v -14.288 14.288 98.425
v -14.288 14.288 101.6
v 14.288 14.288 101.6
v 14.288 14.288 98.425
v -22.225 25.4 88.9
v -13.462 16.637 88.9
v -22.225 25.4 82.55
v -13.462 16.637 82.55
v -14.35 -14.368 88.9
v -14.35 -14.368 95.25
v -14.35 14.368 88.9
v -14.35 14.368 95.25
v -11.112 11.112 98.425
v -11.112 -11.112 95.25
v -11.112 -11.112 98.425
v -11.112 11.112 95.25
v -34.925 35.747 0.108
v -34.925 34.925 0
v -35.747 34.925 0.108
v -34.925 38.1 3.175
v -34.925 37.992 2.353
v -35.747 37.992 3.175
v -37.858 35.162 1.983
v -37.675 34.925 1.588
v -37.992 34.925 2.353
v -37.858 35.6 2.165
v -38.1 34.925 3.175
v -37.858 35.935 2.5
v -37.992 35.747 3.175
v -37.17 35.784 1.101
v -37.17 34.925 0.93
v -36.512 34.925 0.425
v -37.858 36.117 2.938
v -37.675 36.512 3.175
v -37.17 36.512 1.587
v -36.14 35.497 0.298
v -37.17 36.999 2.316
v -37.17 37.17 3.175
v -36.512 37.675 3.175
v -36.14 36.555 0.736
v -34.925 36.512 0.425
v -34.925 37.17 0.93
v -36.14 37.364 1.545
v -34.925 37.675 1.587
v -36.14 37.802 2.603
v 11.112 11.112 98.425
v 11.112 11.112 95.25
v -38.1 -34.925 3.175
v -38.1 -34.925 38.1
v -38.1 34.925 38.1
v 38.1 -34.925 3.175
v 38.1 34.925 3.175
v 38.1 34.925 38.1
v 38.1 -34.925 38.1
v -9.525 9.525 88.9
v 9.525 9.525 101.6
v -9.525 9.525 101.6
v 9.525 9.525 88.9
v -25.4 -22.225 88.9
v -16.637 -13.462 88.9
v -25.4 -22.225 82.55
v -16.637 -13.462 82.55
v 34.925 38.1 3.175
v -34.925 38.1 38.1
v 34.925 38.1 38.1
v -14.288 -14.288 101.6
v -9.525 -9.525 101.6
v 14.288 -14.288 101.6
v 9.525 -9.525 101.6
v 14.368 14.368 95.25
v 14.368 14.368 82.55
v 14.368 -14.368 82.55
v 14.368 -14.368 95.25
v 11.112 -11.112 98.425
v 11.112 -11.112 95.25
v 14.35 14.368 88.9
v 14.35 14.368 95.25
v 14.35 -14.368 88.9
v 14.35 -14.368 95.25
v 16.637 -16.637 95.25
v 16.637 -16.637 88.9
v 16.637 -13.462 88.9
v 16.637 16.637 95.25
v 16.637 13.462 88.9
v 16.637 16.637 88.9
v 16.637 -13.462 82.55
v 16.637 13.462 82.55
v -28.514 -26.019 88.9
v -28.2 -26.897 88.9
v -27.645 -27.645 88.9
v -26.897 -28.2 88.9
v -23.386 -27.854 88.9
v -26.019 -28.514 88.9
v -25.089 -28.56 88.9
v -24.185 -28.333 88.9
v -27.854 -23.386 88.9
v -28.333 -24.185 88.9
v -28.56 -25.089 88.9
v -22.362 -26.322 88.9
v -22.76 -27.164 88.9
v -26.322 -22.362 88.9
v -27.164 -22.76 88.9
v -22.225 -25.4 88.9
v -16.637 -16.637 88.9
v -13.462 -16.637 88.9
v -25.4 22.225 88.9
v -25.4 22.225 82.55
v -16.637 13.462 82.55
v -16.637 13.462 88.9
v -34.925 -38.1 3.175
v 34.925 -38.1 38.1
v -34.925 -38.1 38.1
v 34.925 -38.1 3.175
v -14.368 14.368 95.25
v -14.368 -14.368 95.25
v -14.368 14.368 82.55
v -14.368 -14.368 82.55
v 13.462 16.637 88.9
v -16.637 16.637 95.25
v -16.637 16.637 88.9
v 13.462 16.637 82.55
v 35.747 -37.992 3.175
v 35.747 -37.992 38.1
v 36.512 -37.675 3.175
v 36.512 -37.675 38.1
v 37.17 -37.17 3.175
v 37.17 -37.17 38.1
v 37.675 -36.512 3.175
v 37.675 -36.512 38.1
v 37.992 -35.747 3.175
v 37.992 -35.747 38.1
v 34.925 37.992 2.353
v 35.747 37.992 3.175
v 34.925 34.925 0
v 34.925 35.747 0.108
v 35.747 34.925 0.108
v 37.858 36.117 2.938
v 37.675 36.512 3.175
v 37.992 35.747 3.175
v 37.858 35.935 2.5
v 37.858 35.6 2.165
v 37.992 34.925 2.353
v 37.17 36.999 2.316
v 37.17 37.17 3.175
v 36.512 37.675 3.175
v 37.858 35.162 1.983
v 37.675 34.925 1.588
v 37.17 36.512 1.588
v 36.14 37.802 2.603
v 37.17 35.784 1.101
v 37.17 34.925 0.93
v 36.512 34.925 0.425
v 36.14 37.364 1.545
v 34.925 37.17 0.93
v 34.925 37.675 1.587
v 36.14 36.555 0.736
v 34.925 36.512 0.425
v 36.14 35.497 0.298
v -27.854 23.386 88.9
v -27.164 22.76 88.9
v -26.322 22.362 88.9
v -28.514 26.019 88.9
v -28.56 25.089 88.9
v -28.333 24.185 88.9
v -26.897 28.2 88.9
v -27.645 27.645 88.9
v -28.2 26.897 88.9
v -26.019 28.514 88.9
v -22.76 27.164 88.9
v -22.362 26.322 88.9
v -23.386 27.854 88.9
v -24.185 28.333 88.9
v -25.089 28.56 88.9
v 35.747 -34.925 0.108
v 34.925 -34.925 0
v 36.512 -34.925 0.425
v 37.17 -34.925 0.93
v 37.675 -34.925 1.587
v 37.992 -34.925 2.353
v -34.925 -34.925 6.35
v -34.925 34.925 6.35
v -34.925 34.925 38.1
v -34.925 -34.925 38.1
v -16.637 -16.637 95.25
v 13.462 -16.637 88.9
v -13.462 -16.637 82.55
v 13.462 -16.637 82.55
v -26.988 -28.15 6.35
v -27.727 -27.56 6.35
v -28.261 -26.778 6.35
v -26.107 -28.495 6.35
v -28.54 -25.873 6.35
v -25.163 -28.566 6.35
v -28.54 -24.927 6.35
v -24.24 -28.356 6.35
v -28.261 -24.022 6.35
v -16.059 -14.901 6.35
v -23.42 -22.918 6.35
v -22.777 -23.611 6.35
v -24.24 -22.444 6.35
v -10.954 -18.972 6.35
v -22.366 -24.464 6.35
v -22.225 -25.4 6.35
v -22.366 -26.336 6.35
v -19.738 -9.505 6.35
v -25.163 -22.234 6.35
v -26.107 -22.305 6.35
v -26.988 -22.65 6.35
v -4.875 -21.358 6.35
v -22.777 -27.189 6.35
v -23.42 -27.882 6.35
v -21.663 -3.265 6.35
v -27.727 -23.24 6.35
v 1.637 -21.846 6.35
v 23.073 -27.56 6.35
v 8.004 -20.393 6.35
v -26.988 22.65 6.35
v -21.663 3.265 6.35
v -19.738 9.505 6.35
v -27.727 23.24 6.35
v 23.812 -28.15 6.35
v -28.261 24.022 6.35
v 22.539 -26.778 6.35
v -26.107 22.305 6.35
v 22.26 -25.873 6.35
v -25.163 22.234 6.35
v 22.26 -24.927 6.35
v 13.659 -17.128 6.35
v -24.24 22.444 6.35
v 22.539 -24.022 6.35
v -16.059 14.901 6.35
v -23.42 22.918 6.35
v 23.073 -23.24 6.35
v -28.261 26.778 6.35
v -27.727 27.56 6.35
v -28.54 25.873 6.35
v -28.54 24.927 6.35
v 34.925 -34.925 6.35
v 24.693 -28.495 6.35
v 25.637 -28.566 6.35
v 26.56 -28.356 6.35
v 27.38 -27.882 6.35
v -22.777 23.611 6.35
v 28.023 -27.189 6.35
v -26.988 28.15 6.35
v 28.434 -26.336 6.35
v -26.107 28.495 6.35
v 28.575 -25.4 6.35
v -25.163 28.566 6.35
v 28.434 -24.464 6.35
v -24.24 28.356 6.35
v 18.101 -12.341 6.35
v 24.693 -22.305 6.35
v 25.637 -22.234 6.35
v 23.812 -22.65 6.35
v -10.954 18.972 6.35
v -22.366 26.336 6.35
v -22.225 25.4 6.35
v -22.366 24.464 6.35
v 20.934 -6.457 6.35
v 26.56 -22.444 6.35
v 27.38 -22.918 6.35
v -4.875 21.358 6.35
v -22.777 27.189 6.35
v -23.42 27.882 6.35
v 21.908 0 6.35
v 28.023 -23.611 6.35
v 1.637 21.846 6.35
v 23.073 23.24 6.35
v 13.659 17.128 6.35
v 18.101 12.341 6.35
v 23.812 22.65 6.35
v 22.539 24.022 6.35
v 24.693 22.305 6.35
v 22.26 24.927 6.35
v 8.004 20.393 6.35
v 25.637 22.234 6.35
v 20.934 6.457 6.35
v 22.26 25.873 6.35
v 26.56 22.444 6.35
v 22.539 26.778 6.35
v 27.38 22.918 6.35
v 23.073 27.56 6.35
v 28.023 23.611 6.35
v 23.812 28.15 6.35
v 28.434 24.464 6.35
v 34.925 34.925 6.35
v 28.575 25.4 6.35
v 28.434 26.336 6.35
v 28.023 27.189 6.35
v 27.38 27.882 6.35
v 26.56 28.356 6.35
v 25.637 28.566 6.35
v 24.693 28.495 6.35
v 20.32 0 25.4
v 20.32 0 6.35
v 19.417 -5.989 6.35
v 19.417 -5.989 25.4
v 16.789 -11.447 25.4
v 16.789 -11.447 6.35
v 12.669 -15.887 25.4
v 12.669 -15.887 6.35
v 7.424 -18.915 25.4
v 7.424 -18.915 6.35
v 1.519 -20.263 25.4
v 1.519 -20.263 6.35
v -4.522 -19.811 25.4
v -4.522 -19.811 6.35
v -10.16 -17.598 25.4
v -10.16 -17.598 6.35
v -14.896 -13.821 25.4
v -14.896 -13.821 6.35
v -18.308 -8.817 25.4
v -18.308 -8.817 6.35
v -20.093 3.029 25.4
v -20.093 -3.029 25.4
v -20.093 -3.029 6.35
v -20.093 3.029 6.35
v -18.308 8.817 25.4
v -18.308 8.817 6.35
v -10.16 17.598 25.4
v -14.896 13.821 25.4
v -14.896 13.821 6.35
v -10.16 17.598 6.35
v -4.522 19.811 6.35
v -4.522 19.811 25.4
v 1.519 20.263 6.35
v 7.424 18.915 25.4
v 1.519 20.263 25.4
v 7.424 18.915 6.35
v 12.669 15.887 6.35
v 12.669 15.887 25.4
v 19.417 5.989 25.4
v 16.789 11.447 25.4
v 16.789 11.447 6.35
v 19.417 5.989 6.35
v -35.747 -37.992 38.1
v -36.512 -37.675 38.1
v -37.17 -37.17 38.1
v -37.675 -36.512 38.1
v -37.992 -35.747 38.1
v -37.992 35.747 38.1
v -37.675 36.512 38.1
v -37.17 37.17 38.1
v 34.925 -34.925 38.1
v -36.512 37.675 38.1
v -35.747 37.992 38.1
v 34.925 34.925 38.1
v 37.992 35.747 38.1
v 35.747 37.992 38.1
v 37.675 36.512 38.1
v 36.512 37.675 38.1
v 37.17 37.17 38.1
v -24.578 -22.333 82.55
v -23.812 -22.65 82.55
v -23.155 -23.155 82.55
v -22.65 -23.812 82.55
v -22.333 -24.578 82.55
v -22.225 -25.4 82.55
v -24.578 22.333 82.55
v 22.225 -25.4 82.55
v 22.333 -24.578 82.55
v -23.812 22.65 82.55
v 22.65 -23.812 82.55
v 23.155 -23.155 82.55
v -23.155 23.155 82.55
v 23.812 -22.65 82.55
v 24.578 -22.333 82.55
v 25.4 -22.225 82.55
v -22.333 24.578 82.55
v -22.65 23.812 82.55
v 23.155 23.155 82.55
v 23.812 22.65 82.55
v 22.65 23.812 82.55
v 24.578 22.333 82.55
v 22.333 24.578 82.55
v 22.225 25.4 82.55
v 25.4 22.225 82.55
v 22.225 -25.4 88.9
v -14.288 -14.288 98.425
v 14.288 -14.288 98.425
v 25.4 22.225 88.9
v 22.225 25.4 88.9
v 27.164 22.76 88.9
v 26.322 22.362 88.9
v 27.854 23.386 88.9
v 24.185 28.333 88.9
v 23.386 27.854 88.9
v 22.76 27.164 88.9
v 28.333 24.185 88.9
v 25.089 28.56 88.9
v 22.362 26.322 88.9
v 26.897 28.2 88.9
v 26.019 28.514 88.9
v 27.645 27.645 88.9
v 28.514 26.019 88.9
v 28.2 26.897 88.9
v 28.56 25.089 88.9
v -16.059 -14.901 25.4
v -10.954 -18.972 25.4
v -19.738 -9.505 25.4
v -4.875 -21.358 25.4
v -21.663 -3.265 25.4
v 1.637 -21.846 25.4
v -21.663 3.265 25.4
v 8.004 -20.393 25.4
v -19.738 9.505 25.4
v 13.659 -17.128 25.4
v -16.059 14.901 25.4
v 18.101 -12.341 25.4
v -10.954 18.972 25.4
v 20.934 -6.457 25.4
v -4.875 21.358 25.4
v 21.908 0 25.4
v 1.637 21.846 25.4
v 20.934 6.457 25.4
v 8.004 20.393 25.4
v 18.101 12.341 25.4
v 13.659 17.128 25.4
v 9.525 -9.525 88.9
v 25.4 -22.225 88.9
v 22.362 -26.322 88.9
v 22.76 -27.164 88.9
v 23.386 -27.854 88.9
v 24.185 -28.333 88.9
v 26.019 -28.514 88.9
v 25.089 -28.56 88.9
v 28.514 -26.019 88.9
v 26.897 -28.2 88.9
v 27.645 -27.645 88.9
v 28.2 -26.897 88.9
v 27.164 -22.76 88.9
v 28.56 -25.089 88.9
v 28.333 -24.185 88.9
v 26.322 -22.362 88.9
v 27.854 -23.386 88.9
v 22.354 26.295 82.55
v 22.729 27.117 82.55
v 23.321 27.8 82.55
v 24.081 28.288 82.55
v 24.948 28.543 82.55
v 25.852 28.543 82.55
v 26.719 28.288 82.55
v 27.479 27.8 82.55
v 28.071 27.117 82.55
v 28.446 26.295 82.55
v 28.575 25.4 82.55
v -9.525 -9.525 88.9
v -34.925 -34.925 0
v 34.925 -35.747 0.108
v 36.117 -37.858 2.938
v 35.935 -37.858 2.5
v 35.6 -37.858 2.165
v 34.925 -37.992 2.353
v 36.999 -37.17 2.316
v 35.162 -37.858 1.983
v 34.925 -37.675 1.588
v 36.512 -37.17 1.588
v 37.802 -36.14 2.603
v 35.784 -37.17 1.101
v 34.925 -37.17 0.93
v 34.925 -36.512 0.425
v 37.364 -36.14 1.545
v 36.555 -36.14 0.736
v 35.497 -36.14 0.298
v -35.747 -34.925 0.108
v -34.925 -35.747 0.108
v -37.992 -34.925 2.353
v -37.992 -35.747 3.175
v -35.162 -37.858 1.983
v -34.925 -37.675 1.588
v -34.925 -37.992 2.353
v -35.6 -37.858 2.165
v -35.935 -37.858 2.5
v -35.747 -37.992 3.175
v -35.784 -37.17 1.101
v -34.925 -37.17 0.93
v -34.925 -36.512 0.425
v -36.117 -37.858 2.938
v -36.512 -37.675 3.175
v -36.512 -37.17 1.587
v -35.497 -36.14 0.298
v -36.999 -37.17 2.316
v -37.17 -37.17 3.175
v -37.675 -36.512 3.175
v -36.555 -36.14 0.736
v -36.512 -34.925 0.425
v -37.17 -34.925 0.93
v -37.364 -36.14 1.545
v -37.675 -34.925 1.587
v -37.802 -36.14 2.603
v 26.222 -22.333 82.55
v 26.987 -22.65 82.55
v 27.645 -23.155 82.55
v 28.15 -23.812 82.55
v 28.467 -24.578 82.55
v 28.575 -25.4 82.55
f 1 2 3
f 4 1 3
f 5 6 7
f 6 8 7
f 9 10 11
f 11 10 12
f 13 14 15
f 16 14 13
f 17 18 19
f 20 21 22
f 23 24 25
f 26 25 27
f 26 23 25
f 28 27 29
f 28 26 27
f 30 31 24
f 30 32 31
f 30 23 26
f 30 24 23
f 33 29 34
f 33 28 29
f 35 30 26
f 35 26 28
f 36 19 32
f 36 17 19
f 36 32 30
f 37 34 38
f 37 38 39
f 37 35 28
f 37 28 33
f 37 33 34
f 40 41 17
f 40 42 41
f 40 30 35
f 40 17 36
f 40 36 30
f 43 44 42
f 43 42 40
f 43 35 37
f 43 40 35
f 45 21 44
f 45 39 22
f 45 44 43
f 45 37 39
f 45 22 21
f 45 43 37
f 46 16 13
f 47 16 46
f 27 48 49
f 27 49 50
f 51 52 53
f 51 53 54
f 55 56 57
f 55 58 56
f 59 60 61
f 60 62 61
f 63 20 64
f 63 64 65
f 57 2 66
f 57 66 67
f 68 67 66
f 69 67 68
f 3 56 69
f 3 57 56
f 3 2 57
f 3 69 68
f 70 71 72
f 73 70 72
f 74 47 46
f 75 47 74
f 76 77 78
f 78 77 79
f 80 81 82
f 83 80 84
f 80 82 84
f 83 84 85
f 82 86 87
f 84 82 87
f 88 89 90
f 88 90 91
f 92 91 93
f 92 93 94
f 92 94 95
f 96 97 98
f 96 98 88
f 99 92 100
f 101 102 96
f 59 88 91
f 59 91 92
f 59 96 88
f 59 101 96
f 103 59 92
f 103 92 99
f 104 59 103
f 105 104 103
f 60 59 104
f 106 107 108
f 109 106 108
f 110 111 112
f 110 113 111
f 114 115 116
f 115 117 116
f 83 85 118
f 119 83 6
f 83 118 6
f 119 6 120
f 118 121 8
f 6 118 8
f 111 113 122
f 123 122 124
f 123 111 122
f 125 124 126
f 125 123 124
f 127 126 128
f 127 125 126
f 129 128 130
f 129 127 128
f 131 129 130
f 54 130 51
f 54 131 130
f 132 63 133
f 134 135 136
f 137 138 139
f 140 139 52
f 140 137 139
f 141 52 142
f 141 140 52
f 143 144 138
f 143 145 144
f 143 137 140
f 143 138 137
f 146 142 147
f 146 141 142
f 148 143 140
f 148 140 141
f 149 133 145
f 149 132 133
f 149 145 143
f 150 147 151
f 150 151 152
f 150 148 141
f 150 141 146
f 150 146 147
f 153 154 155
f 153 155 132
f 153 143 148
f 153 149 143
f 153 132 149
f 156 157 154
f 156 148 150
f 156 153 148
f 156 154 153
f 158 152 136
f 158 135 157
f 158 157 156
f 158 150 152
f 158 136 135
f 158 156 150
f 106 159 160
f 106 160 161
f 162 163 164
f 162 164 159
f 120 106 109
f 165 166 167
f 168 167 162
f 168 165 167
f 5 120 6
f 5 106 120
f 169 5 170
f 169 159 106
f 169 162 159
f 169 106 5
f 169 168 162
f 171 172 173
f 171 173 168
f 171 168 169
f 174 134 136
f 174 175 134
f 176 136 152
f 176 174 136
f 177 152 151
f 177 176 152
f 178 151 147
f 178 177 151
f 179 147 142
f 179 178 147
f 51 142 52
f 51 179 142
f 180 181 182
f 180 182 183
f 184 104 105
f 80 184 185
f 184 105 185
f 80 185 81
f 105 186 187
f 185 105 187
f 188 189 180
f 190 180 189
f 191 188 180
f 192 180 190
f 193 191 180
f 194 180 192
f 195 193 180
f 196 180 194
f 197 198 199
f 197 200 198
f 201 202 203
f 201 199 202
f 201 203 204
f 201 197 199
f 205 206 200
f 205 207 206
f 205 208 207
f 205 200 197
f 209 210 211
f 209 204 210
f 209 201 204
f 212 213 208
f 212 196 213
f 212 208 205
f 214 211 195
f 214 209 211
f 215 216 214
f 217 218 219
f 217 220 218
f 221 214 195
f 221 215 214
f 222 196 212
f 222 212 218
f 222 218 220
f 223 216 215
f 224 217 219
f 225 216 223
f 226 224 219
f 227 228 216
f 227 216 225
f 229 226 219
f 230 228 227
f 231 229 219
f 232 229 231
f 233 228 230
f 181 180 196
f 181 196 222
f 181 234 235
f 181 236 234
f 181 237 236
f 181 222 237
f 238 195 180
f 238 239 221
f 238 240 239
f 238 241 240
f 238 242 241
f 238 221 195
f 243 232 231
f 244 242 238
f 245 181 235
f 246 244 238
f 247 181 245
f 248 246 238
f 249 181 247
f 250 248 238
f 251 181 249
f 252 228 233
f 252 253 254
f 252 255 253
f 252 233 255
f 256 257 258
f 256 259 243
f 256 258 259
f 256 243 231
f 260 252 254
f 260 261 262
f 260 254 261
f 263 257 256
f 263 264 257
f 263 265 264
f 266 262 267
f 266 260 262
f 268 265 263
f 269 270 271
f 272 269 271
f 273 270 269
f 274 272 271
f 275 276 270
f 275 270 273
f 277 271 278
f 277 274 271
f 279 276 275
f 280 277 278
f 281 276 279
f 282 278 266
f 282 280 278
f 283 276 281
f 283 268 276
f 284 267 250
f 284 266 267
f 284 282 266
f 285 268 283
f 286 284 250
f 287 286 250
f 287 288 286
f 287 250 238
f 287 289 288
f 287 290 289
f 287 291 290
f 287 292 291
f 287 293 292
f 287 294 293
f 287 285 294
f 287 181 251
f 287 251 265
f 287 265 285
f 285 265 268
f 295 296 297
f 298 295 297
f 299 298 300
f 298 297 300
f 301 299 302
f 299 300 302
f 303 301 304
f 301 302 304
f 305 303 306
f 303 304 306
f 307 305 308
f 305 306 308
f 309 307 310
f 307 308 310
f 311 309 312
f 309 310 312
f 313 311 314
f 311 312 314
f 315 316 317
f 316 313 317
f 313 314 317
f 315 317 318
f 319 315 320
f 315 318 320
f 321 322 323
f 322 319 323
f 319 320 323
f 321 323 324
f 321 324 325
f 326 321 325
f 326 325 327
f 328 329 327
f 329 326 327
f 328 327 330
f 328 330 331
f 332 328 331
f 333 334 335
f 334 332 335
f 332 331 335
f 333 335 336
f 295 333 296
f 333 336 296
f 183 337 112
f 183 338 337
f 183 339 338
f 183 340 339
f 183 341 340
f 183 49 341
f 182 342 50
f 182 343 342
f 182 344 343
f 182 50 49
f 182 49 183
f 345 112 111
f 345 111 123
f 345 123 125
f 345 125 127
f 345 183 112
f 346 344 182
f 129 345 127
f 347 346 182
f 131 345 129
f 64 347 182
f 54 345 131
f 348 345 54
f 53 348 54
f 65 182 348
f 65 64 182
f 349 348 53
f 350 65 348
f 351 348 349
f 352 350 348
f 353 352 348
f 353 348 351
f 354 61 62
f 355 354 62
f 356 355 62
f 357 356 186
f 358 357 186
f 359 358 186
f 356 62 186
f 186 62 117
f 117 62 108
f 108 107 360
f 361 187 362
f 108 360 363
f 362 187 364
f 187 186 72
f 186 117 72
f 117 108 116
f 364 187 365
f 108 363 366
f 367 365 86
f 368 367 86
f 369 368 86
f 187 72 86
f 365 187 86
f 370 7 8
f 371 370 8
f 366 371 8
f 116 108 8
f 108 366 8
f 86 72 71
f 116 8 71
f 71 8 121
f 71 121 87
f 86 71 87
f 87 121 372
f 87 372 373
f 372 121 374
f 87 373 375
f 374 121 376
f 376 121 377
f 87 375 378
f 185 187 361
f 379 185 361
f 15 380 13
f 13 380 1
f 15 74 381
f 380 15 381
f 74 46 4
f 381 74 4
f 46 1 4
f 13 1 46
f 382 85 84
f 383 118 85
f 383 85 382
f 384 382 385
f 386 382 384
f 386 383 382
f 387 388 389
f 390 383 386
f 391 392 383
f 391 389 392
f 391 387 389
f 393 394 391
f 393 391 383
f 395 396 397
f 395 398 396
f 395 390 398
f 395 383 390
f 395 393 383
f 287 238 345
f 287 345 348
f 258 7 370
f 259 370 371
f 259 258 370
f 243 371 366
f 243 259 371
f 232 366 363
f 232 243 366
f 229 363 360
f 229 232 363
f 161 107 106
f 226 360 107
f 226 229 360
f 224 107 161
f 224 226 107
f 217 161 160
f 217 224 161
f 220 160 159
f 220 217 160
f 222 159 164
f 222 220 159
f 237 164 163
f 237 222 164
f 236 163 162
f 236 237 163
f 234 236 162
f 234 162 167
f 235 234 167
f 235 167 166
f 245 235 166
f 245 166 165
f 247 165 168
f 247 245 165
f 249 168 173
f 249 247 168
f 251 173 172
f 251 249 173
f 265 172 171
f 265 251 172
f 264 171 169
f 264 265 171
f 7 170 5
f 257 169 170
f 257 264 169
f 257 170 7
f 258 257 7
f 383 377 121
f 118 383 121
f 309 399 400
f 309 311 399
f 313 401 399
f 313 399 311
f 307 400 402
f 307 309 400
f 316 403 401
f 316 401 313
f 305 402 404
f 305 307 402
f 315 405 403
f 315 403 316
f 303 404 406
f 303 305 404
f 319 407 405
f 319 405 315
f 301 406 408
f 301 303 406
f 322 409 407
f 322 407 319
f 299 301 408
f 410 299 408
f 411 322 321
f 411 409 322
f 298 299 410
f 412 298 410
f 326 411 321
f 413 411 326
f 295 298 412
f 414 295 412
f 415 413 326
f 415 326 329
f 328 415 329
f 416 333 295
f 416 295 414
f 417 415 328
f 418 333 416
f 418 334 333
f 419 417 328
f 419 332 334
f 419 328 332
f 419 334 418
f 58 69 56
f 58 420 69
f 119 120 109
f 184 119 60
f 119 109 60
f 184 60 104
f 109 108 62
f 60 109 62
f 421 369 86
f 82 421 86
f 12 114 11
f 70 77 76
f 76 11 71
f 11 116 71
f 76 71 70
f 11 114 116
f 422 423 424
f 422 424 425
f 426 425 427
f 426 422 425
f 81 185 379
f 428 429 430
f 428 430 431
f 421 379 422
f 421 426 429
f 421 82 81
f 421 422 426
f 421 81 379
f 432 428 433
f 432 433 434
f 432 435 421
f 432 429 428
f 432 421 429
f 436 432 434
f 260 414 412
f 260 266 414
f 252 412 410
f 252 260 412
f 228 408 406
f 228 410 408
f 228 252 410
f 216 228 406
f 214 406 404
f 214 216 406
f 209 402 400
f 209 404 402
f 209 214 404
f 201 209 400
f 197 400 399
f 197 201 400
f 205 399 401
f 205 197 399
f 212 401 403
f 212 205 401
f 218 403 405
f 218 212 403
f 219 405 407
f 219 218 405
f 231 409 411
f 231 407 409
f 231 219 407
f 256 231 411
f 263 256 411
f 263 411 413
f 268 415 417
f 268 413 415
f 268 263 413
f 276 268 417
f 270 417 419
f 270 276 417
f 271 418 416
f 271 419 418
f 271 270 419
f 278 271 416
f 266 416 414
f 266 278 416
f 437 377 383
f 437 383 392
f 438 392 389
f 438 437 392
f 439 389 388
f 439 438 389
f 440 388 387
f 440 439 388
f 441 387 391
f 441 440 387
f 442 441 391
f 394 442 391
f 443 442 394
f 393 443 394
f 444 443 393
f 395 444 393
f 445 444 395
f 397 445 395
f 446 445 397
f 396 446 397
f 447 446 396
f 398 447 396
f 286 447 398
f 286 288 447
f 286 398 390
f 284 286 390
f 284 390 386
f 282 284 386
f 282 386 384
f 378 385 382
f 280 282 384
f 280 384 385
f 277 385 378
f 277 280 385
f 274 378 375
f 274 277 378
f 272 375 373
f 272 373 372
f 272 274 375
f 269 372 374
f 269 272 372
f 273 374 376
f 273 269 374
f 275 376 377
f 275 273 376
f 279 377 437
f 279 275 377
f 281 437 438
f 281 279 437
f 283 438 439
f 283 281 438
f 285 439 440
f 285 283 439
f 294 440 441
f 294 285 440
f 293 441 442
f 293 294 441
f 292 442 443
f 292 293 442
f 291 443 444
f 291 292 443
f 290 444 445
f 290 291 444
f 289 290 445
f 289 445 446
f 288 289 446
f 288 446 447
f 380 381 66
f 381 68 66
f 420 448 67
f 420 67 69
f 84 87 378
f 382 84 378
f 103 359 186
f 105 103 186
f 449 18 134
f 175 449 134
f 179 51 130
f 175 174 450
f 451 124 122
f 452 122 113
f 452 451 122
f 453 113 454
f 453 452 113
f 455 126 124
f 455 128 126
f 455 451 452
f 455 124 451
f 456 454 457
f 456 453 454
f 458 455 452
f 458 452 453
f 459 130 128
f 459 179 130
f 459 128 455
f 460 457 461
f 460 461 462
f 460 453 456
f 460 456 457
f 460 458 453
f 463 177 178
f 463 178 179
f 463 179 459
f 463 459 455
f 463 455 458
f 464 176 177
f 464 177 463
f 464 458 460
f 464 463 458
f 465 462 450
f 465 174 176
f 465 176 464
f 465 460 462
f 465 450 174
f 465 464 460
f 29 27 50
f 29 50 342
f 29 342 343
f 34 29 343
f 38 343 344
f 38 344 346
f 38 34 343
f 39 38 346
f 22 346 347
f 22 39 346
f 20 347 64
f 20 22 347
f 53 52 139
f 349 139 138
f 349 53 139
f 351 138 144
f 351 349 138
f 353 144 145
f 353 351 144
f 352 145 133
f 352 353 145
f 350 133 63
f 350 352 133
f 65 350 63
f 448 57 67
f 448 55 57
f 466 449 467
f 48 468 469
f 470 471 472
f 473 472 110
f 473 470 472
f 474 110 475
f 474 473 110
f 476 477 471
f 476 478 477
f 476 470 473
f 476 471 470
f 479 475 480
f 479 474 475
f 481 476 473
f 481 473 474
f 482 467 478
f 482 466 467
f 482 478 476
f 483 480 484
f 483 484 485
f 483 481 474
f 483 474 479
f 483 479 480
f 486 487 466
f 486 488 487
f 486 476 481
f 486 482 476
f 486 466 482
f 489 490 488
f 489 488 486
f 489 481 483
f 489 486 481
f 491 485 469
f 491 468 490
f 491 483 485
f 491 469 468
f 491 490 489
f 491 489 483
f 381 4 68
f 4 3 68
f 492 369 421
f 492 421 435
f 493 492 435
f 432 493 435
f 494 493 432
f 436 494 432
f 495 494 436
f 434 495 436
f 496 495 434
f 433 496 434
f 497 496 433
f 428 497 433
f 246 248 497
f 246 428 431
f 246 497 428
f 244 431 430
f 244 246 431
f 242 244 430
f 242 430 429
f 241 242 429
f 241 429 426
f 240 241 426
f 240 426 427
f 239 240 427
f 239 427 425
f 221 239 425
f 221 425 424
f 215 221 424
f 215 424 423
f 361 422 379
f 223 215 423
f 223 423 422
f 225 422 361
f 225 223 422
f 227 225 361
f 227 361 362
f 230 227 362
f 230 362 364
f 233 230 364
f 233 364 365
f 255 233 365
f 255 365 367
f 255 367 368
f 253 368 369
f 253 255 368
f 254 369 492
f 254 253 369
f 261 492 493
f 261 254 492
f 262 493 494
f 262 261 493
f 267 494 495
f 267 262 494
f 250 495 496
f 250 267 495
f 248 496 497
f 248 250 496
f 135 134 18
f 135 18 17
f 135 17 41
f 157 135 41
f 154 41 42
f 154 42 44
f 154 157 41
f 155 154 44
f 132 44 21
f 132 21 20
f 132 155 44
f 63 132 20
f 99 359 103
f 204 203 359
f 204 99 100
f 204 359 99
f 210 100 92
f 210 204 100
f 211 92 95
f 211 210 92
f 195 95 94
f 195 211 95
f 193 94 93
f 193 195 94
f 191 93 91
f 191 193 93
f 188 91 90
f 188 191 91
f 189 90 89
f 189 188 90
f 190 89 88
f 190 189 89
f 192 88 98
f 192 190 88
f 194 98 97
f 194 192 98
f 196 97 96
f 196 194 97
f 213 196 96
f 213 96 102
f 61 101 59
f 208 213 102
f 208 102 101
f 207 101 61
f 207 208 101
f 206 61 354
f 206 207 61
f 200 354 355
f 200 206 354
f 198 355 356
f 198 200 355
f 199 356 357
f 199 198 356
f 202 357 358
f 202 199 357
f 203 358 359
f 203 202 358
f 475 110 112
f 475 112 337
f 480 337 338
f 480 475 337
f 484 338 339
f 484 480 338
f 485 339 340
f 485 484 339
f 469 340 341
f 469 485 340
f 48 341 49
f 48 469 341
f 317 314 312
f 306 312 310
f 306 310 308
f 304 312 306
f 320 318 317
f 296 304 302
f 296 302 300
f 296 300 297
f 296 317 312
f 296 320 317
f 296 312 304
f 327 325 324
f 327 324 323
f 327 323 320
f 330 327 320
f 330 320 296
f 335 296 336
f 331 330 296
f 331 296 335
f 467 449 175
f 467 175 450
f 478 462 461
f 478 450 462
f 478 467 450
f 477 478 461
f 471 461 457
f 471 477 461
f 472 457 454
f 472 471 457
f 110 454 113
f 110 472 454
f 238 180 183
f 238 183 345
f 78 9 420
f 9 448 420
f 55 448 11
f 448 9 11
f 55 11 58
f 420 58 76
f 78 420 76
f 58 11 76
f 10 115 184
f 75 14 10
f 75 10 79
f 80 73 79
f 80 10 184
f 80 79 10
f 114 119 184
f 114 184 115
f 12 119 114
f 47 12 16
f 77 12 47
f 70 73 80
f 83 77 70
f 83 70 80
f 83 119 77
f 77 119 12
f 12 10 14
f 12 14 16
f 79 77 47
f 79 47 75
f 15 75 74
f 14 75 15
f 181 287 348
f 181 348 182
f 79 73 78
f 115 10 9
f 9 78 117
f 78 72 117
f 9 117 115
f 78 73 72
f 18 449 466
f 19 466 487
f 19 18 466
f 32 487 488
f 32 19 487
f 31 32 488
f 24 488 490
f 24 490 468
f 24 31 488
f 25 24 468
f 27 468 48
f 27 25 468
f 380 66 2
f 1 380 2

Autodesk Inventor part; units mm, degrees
ref_plane "YZ Plane" through (0, 0, 0) normal (1, 0, 0) x (0, 1, 0)
ref_plane "XZ Plane" through (0, 0, 0) normal (0, 1, 0) x (-1, 0, 0)
ref_plane "XY Plane" through (0, 0, 0) normal (0, 0, 1) x (1, 0, 0)
sketch "Sketch1" plane through (0, 0, 0) normal (0, 0, 1) x (1, 0, 0)
  line L0 (38.1, -38.1) -> (-38.1, -38.1)
  line L1 (-38.1, -38.1) -> (-38.1, 38.1)
  line L2 (-38.1, 38.1) -> (38.1, 38.1)
  line L3 (38.1, 38.1) -> (38.1, -38.1)
  line L4 (38.1, -38.1) -> (-38.1, 38.1) construction
  line L5 (-38.1, -38.1) -> (38.1, 38.1) construction
  line L6 (-34.925, -34.925) -> (34.925, -34.925)
  line L7 (34.925, -34.925) -> (34.925, 34.925)
  line L8 (34.925, 34.925) -> (-34.925, 34.925)
  line L9 (-34.925, 34.925) -> (-34.925, -34.925)
  line L10 (-34.925, -34.925) -> (34.925, 34.925) construction
  line L11 (34.925, -34.925) -> (-34.925, 34.925) construction
  point P0 (0, 0)
  dimension "d0" = 76.2
  dimension "d1" = 76.2
  dimension "d2" = 69.85
  dimension "d3" = 69.85
extrude "Extrusion1" add sketch "Sketch1" along normal blind 6.35 contours L0 L1 L2 L3 | L9 L8 L7 L6
extrude "Extrusion2" add sketch "Sketch1" along normal blind 38.1
fillet "Fillet1" radius 3.175 8 edges at (0, 38.1, 0) (38.1, 0, 0) (-38.1, 0, 0) (0, -38.1, 0) (38.1, 38.1, 19.05) (-38.1, 38.1, 19.05) (38.1, -38.1, 19.05) (-38.1, -38.1, 19.05)
sketch "Sketch2" plane through (0, 0, 6.35) normal (0, 0, 1) x (1, 0, 0)
  circle A0 centre (0, 0) radius 20.32
  circle A1 centre (0, 0) radius 21.9075
  dimension "d9" = 40.64
  dimension "d10" = 43.815
extrude "Extrusion3" add sketch "Sketch2" along normal blind 19.05
sketch "Sketch3" plane through (0, 0, 6.35) normal (0, 0, 1) x (1, 0, 0)
  line L0 (-25.4, -25.4) -> (25.4, -25.4)
  line L1 (25.4, -25.4) -> (25.4, 25.4)
  line L2 (25.4, 25.4) -> (-25.4, 25.4)
  line L3 (-25.4, 25.4) -> (-25.4, -25.4)
  line L4 (-25.4, -25.4) -> (25.4, 25.4) construction
  line L5 (25.4, -25.4) -> (-25.4, 25.4) construction
  circle A0 centre (25.4, 25.4) radius 3.175
  circle A1 centre (-25.4, 25.4) radius 3.175
  circle A2 centre (-25.4, -25.4) radius 3.175
  circle A3 centre (25.4, -25.4) radius 3.175
  point P0 (0, 0)
  dimension "d13" = 50.8
  dimension "d14" = 50.8
  dimension "d15" = 6.35
  dimension "d16" = 6.35
  dimension "d17" = 6.35
  dimension "d18" = 6.35
extrude "Extrusion4" add sketch "Sketch3" along normal blind 76.2 contours L3 A2 L0 | L0 A2 L3 | A3 L1 L0 | L0 L1 A3 | A1 L2 L3 | L3 L2 A1 | A0 L2 L1 | L1 L2 A0
sketch "Sketch4" plane through (25.4, 25.4, 82.55) normal (0, 0, 1) x (1, 0, 0)
  line L0 (0, 0) -> (-3.175, 0)
  circle A0 centre (-50.8, -50.8) radius 3.175
  circle A1 centre (0, -50.8) radius 3.175
  circle A2 centre (0, 0) radius 3.175
  circle A3 centre (-50.8, 0) radius 3.175
  circle A4 centre (-50.8, -50.8) radius 3.175 projected
  line L1 (-50.8, -47.625) -> (-47.625, -50.8)
  line L2 (1.5875, -1.5875) -> (-1.5875, 1.5875)
  circle A5 centre (-50.8, 0) radius 3.175 projected
  line L3 (-1.5875, -52.3875) -> (1.5875, -49.2125)
  line L4 (-38.862, -42.037) -> (-11.938, -42.037)
  line L5 (-8.763, -38.862) -> (-8.763, -11.938)
  line L6 (-11.938, -8.763) -> (-38.862, -8.763)
  line L7 (-42.037, -11.938) -> (-42.037, -38.862)
  line L8 (-42.037, -42.037) -> (-8.763, -8.763) construction
  line L9 (-8.763, -42.037) -> (-42.037, -8.763) construction
  line L10 (-11.0316, -39.7684) -> (-39.7684, -39.7684)
  line L11 (-39.7684, -39.7684) -> (-39.7684, -11.0316)
  line L12 (-39.7684, -11.0316) -> (-11.0316, -11.0316)
  line L13 (-11.0316, -11.0316) -> (-11.0316, -39.7684)
  line L14 (-11.0316, -39.7684) -> (-39.7684, -11.0316) construction
  line L15 (-39.7684, -39.7684) -> (-11.0316, -11.0316) construction
  line L16 (-50.8, -3.175) -> (-42.037, -11.938)
  line L17 (1.5875, -49.2125) -> (-8.763, -38.862)
  line L18 (-38.862, -8.763) -> (-47.625, 0)
  line L19 (-8.763, -11.938) -> (1.5875, -1.5875)
  line L20 (-1.5875, 1.5875) -> (-11.938, -8.763)
  line L21 (-42.037, -38.862) -> (-50.8, -47.625)
  line L22 (-47.625, -50.8) -> (-38.862, -42.037)
  line L23 (-11.938, -42.037) -> (-1.5875, -52.3875)
  line L24 (0, -50.8) -> (0, -47.625)
  line L25 (0, -3.175) -> (0, 0)
  line L26 (-50.8, -50.8) -> (-47.625, -50.8)
  line L27 (-3.175, -50.8) -> (0, -50.8)
  line L28 (-50.8, 0) -> (-50.8, -3.175)
  line L29 (-50.8, -47.625) -> (-50.8, -50.8)
  line L30 (-8.763, -11.938) -> (-8.763, -8.763)
  line L31 (-11.938, -8.763) -> (-8.763, -8.763)
  line L32 (-38.862, -8.763) -> (-42.037, -8.763)
  line L33 (-42.037, -11.938) -> (-42.037, -8.763)
  line L34 (-42.037, -38.862) -> (-42.037, -42.037)
  line L35 (-38.862, -42.037) -> (-42.037, -42.037)
  line L36 (-11.938, -42.037) -> (-8.763, -42.037)
  line L37 (-8.763, -42.037) -> (-8.763, -38.862)
  point P0 (-25.4, -25.4)
  point P1 (-25.4, -25.4)
  point P2 (-47.625, 0)
  point P3 (-3.175, -50.8)
  point P4 (0, -47.625)
  point P5 (0, -3.175)
  point P6 (-3.175, 0)
  dimension "d21" = 50.8
  dimension "d22" = 50.8
  dimension "d23" = 33.274
  dimension "d24" = 33.274
extrude "Extrusion5" add sketch "Sketch4" along normal blind 6.35
extrude "Extrusion6" add sketch "Sketch4" along normal blind 12.7 contours L31 L30 L5 L37 L36 L4 L35 L34 L7 L33 L32 L6
sketch "Sketch5" plane through (25.4, 25.4, 95.25) normal (0, 0, 1) x (1, 0, 0)
  circle A0 centre (-25.4, -25.4) radius 20.32 projected
  line L0 (-39.7495, -11.0127) -> (-11.0505, -11.0127)
  line L1 (-11.0505, -11.0127) -> (-11.0505, -39.7873)
  line L2 (-11.0505, -39.7873) -> (-39.7495, -39.7873)
  line L3 (-39.7495, -39.7873) -> (-39.7495, -11.0127)
  line L4 (-39.7495, -11.0127) -> (-11.0505, -39.7873) construction
  line L5 (-11.0505, -11.0127) -> (-39.7495, -39.7873) construction
  line L6 (-34.925, -34.925) -> (-15.875, -34.925)
  line L7 (-15.875, -34.925) -> (-15.875, -15.875)
  line L8 (-15.875, -15.875) -> (-34.925, -15.875)
  line L9 (-34.925, -15.875) -> (-34.925, -34.925)
  line L10 (-34.925, -34.925) -> (-15.875, -15.875) construction
  line L11 (-15.875, -34.925) -> (-34.925, -15.875) construction
  line L12 (-14.2875, -36.5125) -> (-36.5125, -36.5125)
  line L13 (-36.5125, -36.5125) -> (-36.5125, -14.2875)
  line L14 (-36.5125, -14.2875) -> (-14.2875, -14.2875)
  line L15 (-14.2875, -14.2875) -> (-14.2875, -36.5125)
  line L16 (-14.2875, -36.5125) -> (-36.5125, -14.2875) construction
  line L17 (-36.5125, -36.5125) -> (-14.2875, -14.2875) construction
  dimension "d29" = 19.05
  dimension "d30" = 19.05
  dimension "d33" = 22.225
  dimension "d34" = 22.225
extrude "Extrusion8" add sketch "Sketch5" against normal blind 6.35 contours L1 L2 L3 L0 | L12 L13 L14 L15
extrude "Extrusion9" add sketch "Sketch5" along normal blind 6.35 contours L12 L13 L14 L15
sketch "Sketch6" plane through (25.4, 25.4, 101.6) normal (0, 0, 1) x (1, 0, 0)
  line L0 (-14.2875, -36.5125) -> (-36.5125, -36.5125) projected
  line L1 (-36.5125, -14.2875) -> (-14.2875, -14.2875)
  line L2 (-14.2875, -14.2875) -> (-14.2875, -36.5125)
  line L3 (-14.2875, -36.5125) -> (-36.5125, -36.5125)
  line L4 (-36.5125, -36.5125) -> (-36.5125, -14.2875)
  line L5 (-36.5125, -14.2875) -> (-14.2875, -36.5125) construction
  line L6 (-14.2875, -14.2875) -> (-36.5125, -36.5125) construction
  line L7 (-39.6875, -11.1125) -> (-11.1125, -11.1125)
  line L8 (-11.1125, -11.1125) -> (-11.1125, -39.6875)
  line L9 (-11.1125, -39.6875) -> (-39.6875, -39.6875)
  line L10 (-39.6875, -39.6875) -> (-39.6875, -11.1125)
  line L11 (-39.6875, -11.1125) -> (-11.1125, -39.6875) construction
  line L12 (-11.1125, -11.1125) -> (-39.6875, -39.6875) construction
  point P0 (-25.4, -25.4)
  dimension "d39" = 28.575
  dimension "d40" = 28.575
extrude "Extrusion10" add sketch "Sketch6" against normal blind 3.175
equation "\"d34\" = d33"
properties part number "Hot Air Ballon"
